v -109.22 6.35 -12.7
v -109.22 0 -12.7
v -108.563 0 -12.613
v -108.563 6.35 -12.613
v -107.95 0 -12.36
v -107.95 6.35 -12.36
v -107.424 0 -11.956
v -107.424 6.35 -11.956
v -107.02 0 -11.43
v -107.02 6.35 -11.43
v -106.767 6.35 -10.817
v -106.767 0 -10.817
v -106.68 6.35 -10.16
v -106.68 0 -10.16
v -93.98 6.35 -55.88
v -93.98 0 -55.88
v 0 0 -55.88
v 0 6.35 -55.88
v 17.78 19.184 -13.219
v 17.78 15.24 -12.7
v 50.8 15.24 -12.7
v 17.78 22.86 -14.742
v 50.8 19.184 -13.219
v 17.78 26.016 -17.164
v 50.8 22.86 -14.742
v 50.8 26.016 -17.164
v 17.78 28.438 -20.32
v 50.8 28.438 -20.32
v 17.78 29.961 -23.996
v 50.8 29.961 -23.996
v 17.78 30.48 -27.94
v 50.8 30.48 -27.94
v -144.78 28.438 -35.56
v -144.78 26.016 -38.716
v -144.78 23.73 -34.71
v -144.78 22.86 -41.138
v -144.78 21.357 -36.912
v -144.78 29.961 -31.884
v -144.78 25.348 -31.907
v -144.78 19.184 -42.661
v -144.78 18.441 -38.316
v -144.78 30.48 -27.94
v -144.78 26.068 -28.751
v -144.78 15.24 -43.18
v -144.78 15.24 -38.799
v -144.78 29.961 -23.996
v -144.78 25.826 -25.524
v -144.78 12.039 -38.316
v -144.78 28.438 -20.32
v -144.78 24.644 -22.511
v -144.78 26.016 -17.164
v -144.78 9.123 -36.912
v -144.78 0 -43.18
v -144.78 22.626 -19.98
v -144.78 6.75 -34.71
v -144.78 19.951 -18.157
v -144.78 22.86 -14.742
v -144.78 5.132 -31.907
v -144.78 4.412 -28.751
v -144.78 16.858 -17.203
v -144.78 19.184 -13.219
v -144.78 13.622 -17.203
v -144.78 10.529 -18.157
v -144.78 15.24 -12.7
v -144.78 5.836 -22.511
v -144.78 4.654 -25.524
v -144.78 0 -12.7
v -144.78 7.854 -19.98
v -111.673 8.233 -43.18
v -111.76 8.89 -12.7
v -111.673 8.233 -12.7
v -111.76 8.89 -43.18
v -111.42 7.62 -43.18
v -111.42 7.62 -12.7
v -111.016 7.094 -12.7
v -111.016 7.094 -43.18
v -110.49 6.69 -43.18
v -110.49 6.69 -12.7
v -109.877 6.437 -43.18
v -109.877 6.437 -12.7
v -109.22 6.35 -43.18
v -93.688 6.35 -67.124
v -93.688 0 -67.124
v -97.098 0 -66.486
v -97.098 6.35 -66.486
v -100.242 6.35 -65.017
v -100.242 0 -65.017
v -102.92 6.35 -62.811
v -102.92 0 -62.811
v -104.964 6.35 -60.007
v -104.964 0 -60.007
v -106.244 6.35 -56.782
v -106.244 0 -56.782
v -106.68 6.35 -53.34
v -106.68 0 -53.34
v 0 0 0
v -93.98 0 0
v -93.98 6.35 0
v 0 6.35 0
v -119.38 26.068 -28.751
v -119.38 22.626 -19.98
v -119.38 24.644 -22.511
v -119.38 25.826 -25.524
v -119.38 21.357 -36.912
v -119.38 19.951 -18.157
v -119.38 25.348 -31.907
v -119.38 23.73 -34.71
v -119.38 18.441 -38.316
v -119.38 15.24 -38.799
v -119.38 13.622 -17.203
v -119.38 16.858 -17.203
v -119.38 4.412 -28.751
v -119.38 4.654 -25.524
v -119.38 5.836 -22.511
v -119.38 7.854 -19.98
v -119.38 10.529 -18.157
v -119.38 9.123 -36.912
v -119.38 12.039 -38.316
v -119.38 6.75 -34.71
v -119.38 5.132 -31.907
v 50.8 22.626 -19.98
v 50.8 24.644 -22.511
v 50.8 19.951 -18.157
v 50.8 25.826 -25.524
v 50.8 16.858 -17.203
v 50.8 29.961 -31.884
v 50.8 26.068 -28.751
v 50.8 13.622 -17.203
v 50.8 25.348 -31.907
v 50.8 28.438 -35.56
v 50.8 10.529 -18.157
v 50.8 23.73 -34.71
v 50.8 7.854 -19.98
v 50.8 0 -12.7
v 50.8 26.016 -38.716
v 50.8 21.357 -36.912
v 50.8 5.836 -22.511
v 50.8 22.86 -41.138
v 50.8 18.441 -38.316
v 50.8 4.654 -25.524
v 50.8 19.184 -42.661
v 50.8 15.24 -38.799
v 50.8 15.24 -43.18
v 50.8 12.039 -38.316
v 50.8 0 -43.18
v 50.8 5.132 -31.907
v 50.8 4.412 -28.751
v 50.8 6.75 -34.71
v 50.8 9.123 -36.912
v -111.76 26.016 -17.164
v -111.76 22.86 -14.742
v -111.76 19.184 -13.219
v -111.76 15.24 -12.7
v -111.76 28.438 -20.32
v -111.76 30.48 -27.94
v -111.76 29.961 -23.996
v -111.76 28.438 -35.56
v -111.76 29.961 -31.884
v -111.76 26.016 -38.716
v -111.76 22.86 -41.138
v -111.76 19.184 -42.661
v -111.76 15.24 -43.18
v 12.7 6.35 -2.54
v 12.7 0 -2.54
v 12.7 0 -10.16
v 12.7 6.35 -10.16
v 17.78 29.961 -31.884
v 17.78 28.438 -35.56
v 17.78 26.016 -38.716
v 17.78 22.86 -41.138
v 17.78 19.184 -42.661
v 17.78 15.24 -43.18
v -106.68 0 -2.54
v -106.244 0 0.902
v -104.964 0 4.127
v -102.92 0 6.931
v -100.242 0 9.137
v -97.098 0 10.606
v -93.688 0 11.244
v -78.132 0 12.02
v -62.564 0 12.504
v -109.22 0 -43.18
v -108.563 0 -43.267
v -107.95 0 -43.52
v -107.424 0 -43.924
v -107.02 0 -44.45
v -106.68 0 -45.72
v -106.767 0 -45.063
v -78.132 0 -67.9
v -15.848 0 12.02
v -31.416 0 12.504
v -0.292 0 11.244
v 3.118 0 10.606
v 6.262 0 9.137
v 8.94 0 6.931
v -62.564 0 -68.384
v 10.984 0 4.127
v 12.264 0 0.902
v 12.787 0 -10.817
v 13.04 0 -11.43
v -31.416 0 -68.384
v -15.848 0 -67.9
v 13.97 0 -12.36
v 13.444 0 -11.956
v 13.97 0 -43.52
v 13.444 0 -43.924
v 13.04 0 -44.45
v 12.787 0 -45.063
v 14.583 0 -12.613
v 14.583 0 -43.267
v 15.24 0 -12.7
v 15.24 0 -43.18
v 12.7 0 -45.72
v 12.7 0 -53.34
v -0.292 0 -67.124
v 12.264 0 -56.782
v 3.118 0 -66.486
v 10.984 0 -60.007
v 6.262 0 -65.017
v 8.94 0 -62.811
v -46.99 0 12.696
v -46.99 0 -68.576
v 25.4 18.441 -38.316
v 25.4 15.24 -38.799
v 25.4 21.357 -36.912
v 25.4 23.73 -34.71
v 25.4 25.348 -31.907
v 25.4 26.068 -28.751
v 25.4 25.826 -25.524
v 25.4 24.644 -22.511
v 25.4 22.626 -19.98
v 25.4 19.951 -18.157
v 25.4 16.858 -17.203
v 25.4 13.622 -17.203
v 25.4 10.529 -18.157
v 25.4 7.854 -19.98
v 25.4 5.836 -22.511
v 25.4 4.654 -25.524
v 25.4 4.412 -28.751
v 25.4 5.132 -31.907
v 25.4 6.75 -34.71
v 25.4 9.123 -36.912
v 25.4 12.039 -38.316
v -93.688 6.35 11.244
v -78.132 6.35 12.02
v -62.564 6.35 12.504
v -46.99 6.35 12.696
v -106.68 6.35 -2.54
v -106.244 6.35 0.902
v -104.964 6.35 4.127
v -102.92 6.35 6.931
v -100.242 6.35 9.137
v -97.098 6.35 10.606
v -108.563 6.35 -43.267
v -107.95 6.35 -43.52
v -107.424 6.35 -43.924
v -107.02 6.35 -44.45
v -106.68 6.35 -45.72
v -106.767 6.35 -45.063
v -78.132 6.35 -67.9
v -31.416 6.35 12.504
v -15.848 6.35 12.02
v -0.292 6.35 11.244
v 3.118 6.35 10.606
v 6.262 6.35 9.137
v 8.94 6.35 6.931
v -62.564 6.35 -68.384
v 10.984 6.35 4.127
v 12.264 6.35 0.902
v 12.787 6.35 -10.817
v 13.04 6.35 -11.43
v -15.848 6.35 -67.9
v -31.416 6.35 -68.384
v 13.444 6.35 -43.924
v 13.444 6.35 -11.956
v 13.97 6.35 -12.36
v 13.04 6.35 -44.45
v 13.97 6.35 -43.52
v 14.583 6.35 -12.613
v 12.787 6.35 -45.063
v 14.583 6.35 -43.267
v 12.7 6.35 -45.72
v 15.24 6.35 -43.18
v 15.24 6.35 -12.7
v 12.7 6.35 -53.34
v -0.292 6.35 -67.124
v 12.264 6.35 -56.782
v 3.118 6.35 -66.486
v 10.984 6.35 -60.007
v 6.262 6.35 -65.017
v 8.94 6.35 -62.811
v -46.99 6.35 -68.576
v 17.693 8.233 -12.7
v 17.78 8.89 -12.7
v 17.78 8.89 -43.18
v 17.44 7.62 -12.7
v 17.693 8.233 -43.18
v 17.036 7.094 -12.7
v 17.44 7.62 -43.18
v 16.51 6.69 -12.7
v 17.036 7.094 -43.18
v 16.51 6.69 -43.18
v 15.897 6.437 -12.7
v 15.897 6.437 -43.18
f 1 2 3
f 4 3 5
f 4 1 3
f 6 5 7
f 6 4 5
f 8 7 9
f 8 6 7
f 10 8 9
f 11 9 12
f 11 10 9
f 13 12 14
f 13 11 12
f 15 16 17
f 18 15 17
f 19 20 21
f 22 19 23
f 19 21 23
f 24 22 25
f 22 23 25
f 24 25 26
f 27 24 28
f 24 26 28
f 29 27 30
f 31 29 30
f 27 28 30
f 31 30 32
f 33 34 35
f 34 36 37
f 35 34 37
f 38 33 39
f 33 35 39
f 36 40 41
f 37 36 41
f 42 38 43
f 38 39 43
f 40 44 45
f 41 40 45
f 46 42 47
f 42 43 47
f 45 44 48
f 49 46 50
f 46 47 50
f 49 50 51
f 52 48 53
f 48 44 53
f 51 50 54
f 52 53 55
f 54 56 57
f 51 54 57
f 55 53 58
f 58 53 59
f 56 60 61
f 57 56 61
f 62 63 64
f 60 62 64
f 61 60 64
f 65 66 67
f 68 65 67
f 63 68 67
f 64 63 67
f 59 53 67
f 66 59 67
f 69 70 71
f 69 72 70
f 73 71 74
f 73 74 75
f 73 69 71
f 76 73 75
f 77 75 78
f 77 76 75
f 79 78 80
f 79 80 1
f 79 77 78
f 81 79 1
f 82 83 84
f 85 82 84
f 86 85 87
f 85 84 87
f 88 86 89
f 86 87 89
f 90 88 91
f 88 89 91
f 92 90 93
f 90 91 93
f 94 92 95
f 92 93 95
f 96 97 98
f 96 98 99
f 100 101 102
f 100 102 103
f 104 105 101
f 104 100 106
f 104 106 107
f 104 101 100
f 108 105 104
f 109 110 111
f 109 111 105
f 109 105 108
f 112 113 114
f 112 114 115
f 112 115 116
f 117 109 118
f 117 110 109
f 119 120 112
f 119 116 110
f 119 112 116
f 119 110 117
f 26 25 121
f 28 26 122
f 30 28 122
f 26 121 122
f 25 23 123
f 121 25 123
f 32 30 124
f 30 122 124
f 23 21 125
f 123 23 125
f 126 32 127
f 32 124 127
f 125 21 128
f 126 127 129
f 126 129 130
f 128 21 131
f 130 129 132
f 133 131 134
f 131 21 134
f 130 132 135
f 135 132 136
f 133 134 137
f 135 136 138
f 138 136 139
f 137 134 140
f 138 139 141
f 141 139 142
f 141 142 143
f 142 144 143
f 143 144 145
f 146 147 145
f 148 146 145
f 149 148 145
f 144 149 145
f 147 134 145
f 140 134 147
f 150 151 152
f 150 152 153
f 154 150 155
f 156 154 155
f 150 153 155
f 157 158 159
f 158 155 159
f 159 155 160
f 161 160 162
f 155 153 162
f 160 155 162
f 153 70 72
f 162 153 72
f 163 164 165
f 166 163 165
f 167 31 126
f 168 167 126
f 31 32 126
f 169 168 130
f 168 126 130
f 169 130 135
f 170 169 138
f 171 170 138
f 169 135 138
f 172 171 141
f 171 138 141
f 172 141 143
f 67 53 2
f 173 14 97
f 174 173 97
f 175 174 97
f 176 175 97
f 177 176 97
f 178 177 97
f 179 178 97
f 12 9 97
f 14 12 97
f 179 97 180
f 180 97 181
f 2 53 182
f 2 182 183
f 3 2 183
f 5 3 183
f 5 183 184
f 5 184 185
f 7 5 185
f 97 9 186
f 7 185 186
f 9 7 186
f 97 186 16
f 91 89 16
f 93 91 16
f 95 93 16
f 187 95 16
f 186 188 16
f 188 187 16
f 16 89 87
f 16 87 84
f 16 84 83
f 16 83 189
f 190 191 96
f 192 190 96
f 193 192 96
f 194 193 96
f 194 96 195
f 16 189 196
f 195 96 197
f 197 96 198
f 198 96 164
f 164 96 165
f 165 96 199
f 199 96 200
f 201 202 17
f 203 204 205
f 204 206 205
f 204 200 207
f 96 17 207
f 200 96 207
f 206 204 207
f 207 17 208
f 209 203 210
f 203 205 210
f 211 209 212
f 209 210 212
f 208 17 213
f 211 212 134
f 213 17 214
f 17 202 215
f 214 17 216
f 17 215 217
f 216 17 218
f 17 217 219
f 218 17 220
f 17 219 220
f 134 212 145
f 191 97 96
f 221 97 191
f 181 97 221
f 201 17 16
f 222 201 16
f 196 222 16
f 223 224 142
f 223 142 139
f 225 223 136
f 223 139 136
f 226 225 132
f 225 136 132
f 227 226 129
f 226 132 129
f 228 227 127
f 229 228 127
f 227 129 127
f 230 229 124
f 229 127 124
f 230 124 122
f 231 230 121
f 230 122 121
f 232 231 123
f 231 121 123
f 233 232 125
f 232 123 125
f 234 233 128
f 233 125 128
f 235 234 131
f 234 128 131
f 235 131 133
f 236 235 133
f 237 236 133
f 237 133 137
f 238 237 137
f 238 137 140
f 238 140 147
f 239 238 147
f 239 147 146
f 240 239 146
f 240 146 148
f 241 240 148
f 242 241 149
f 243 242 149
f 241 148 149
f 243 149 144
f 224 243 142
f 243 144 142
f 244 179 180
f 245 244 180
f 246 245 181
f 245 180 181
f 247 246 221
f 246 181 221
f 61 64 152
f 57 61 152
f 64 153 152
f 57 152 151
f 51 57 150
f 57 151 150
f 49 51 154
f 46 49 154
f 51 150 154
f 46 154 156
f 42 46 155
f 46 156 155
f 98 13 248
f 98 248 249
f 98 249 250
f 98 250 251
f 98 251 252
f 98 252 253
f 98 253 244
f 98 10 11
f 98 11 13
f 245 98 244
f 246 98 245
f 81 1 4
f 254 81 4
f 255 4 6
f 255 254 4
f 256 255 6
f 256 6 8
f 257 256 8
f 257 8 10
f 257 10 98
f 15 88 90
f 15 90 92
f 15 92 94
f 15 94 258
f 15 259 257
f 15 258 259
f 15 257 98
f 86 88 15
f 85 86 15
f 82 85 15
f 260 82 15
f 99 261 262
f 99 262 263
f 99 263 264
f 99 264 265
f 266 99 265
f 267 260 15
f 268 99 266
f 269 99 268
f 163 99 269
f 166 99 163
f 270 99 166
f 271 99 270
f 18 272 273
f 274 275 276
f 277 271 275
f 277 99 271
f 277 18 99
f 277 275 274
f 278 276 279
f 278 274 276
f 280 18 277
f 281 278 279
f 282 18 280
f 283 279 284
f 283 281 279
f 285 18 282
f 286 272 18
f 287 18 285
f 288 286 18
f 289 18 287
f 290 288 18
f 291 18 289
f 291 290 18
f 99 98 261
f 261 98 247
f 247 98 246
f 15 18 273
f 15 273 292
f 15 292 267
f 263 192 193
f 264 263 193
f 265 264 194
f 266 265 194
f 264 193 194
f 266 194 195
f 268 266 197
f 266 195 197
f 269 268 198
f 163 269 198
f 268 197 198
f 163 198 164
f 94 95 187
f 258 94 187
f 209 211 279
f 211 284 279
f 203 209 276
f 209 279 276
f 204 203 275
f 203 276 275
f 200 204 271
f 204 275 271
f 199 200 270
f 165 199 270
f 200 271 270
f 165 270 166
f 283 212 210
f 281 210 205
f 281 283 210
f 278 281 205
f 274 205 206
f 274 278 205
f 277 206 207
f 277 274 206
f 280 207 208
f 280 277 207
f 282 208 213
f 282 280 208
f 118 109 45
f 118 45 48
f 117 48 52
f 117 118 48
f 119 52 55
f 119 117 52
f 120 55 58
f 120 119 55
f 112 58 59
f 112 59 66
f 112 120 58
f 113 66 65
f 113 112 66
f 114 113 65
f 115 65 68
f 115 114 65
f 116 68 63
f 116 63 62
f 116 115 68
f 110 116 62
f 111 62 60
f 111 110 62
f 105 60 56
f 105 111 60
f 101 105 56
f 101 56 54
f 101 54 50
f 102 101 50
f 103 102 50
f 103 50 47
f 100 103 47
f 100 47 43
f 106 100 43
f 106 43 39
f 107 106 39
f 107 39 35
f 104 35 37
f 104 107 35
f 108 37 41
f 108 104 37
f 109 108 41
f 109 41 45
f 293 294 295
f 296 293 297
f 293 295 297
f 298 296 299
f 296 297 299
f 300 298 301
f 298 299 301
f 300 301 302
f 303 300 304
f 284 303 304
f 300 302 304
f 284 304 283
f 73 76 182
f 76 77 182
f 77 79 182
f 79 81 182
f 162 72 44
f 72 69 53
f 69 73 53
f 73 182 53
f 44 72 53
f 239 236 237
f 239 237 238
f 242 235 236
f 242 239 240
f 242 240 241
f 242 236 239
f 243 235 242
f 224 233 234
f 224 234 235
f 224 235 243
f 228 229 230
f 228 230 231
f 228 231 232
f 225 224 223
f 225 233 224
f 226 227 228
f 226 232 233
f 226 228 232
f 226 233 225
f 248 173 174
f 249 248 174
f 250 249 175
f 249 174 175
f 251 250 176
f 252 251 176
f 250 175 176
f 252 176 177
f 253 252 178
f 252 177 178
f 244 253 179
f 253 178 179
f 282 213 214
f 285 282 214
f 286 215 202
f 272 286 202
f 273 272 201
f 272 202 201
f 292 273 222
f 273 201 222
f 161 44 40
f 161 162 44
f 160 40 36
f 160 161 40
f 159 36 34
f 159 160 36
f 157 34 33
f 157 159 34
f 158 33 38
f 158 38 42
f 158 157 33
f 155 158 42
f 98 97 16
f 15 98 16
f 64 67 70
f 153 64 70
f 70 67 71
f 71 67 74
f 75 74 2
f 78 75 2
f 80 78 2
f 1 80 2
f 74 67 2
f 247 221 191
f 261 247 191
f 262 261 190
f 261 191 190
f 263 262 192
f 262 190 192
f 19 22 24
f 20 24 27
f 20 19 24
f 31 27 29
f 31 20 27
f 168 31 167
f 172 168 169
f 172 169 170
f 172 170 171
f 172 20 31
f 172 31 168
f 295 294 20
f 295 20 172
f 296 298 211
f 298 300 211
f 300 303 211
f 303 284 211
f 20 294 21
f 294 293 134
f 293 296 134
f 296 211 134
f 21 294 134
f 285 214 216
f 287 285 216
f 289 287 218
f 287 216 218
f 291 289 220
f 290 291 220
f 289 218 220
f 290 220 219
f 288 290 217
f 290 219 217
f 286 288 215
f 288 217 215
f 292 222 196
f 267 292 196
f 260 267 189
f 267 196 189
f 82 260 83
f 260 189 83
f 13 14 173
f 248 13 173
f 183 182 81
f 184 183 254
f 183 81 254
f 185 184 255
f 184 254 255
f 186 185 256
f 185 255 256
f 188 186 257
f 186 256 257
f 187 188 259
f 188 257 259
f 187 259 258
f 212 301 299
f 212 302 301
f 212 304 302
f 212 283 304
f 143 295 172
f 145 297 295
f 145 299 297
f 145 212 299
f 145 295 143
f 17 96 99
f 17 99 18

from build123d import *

# Parameters (mm, degrees)
SKETCH2_W           = 93.98
SKETCH2_H           = 55.88
BOSS_EXTRUDE1_DEPTH = 6.35
SKETCH3_W           = 33.02
SKETCH3_H           = 30.48
BOSS_EXTRUDE2_DEPTH = 24.13
FILLET1_R           = 2.54
SKETCH4_R           = 10.8585
CUT_EXTRUDE1_DEPTH  = 25.4
CUT_EXTRUDE2_START  = -25.4
SKETCH5_R           = 10.8585
CUT_EXTRUDE2_DEPTH  = 25.4
FILLET2_R           = 2.54
FILLET3_R           = 15.24


with BuildPart() as part:
    # Sketch2 → Boss-Extrude1 (new body)
    with BuildSketch(Plane(origin=(0, 0, 0), x_dir=(1, 0, 0), z_dir=(0, 1, 0))):
        with BuildLine():
            ThreePointArc((-93.688069253, -11.244332686), (-70.349230661, -12.298232488), (-46.99, -12.696270789))
            ThreePointArc((-46.99, -12.696270789), (-23.630769339, -12.298232488), (-0.291930747, -11.244332686))
            ThreePointArc((-0.291930747, -11.244332686), (8.940138318, -6.930983214), (12.7, 2.54))
            Line((12.7, 2.54), (12.7, 12.7))
            Line((12.7, 12.7), (50.8, 12.7))
            Line((50.8, 12.7), (50.8, 43.18))
            Line((50.8, 43.18), (12.7, 43.18))
            Line((12.7, 43.18), (12.7, 53.34))
            ThreePointArc((12.7, 53.34), (8.940138318, 62.810983214), (-0.291930747, 67.124332686))
            ThreePointArc((-0.291930747, 67.124332686), (-23.630769339, 68.178232488), (-46.99, 68.576270789))
            ThreePointArc((-46.99, 68.576270789), (-70.349230661, 68.178232488), (-93.688069253, 67.124332686))
            ThreePointArc((-93.688069253, 67.124332686), (-102.920138318, 62.810983214), (-106.68, 53.34))
            Line((-106.68, 53.34), (-106.68, 43.18))
            Line((-106.68, 43.18), (-144.78, 43.18))
            Line((-144.78, 43.18), (-144.78, 12.7))
            Line((-144.78, 12.7), (-106.68, 12.7))
            Line((-106.68, 12.7), (-106.68, 2.54))
            ThreePointArc((-106.68, 2.54), (-102.920138318, -6.930983214), (-93.688069253, -11.244332686))
        make_face()
        with Locations((-46.99, 27.94)):
            Rectangle(SKETCH2_W, SKETCH2_H, mode=Mode.SUBTRACT)
    extrude(amount=BOSS_EXTRUDE1_DEPTH)

    # Sketch3 → Boss-Extrude2 (add)
    with BuildSketch(Plane(origin=(0, 6.35, 0), x_dir=(1, 0, 0), z_dir=(0, 1, 0))):
        with Locations((34.29, 27.94)):
            Rectangle(SKETCH3_W, SKETCH3_H)
        with Locations((-128.27, 27.94)):
            Rectangle(SKETCH3_W, SKETCH3_H)
    extrude(amount=BOSS_EXTRUDE2_DEPTH)

    # Fillet1
    fillet1_edges = [part.edges().sort_by_distance(p)[0] for p in [
        (17.78, 6.35, -27.94),
        (-111.76, 6.35, -27.94),
    ]]
    fillet(fillet1_edges, radius=FILLET1_R)

    # Sketch4 → Cut-Extrude1 (cut)
    with BuildSketch(Plane(origin=(50.8, 0, 0), x_dir=(0, 0, -1), z_dir=(1, 0, 0))):
        with Locations((27.94, 15.24)):
            Circle(SKETCH4_R)
    extrude(amount=-CUT_EXTRUDE1_DEPTH, mode=Mode.SUBTRACT)

    # Sketch5 → Cut-Extrude2 (cut)
    with BuildSketch(Plane.ZY.offset(144.78).offset(CUT_EXTRUDE2_START)):
        with Locations(Location((-27.94, 15.24, 0), (0, 0, 180))):
            Circle(SKETCH5_R)
    extrude(amount=CUT_EXTRUDE2_DEPTH, mode=Mode.SUBTRACT)

    # Fillet2
    fillet2_edges = [part.edges().sort_by_distance(p)[0] for p in [
        (12.7, 3.175, -43.18),
        (12.7, 3.175, -12.7),
        (-106.68, 3.175, -43.18),
        (-106.68, 3.175, -12.7),
    ]]
    fillet(fillet2_edges, radius=FILLET2_R)

    # Fillet3
    fillet3_edges = [part.edges().sort_by_distance(p)[0] for p in [
        (34.29, 30.48, -43.18),
        (34.29, 30.48, -12.7),
        (-128.27, 30.48, -43.18),
        (-128.27, 30.48, -12.7),
    ]]
    fillet(fillet3_edges, radius=FILLET3_R - 0.0001)  # a hair under: the kernel refuses the full size


solid = part.part
